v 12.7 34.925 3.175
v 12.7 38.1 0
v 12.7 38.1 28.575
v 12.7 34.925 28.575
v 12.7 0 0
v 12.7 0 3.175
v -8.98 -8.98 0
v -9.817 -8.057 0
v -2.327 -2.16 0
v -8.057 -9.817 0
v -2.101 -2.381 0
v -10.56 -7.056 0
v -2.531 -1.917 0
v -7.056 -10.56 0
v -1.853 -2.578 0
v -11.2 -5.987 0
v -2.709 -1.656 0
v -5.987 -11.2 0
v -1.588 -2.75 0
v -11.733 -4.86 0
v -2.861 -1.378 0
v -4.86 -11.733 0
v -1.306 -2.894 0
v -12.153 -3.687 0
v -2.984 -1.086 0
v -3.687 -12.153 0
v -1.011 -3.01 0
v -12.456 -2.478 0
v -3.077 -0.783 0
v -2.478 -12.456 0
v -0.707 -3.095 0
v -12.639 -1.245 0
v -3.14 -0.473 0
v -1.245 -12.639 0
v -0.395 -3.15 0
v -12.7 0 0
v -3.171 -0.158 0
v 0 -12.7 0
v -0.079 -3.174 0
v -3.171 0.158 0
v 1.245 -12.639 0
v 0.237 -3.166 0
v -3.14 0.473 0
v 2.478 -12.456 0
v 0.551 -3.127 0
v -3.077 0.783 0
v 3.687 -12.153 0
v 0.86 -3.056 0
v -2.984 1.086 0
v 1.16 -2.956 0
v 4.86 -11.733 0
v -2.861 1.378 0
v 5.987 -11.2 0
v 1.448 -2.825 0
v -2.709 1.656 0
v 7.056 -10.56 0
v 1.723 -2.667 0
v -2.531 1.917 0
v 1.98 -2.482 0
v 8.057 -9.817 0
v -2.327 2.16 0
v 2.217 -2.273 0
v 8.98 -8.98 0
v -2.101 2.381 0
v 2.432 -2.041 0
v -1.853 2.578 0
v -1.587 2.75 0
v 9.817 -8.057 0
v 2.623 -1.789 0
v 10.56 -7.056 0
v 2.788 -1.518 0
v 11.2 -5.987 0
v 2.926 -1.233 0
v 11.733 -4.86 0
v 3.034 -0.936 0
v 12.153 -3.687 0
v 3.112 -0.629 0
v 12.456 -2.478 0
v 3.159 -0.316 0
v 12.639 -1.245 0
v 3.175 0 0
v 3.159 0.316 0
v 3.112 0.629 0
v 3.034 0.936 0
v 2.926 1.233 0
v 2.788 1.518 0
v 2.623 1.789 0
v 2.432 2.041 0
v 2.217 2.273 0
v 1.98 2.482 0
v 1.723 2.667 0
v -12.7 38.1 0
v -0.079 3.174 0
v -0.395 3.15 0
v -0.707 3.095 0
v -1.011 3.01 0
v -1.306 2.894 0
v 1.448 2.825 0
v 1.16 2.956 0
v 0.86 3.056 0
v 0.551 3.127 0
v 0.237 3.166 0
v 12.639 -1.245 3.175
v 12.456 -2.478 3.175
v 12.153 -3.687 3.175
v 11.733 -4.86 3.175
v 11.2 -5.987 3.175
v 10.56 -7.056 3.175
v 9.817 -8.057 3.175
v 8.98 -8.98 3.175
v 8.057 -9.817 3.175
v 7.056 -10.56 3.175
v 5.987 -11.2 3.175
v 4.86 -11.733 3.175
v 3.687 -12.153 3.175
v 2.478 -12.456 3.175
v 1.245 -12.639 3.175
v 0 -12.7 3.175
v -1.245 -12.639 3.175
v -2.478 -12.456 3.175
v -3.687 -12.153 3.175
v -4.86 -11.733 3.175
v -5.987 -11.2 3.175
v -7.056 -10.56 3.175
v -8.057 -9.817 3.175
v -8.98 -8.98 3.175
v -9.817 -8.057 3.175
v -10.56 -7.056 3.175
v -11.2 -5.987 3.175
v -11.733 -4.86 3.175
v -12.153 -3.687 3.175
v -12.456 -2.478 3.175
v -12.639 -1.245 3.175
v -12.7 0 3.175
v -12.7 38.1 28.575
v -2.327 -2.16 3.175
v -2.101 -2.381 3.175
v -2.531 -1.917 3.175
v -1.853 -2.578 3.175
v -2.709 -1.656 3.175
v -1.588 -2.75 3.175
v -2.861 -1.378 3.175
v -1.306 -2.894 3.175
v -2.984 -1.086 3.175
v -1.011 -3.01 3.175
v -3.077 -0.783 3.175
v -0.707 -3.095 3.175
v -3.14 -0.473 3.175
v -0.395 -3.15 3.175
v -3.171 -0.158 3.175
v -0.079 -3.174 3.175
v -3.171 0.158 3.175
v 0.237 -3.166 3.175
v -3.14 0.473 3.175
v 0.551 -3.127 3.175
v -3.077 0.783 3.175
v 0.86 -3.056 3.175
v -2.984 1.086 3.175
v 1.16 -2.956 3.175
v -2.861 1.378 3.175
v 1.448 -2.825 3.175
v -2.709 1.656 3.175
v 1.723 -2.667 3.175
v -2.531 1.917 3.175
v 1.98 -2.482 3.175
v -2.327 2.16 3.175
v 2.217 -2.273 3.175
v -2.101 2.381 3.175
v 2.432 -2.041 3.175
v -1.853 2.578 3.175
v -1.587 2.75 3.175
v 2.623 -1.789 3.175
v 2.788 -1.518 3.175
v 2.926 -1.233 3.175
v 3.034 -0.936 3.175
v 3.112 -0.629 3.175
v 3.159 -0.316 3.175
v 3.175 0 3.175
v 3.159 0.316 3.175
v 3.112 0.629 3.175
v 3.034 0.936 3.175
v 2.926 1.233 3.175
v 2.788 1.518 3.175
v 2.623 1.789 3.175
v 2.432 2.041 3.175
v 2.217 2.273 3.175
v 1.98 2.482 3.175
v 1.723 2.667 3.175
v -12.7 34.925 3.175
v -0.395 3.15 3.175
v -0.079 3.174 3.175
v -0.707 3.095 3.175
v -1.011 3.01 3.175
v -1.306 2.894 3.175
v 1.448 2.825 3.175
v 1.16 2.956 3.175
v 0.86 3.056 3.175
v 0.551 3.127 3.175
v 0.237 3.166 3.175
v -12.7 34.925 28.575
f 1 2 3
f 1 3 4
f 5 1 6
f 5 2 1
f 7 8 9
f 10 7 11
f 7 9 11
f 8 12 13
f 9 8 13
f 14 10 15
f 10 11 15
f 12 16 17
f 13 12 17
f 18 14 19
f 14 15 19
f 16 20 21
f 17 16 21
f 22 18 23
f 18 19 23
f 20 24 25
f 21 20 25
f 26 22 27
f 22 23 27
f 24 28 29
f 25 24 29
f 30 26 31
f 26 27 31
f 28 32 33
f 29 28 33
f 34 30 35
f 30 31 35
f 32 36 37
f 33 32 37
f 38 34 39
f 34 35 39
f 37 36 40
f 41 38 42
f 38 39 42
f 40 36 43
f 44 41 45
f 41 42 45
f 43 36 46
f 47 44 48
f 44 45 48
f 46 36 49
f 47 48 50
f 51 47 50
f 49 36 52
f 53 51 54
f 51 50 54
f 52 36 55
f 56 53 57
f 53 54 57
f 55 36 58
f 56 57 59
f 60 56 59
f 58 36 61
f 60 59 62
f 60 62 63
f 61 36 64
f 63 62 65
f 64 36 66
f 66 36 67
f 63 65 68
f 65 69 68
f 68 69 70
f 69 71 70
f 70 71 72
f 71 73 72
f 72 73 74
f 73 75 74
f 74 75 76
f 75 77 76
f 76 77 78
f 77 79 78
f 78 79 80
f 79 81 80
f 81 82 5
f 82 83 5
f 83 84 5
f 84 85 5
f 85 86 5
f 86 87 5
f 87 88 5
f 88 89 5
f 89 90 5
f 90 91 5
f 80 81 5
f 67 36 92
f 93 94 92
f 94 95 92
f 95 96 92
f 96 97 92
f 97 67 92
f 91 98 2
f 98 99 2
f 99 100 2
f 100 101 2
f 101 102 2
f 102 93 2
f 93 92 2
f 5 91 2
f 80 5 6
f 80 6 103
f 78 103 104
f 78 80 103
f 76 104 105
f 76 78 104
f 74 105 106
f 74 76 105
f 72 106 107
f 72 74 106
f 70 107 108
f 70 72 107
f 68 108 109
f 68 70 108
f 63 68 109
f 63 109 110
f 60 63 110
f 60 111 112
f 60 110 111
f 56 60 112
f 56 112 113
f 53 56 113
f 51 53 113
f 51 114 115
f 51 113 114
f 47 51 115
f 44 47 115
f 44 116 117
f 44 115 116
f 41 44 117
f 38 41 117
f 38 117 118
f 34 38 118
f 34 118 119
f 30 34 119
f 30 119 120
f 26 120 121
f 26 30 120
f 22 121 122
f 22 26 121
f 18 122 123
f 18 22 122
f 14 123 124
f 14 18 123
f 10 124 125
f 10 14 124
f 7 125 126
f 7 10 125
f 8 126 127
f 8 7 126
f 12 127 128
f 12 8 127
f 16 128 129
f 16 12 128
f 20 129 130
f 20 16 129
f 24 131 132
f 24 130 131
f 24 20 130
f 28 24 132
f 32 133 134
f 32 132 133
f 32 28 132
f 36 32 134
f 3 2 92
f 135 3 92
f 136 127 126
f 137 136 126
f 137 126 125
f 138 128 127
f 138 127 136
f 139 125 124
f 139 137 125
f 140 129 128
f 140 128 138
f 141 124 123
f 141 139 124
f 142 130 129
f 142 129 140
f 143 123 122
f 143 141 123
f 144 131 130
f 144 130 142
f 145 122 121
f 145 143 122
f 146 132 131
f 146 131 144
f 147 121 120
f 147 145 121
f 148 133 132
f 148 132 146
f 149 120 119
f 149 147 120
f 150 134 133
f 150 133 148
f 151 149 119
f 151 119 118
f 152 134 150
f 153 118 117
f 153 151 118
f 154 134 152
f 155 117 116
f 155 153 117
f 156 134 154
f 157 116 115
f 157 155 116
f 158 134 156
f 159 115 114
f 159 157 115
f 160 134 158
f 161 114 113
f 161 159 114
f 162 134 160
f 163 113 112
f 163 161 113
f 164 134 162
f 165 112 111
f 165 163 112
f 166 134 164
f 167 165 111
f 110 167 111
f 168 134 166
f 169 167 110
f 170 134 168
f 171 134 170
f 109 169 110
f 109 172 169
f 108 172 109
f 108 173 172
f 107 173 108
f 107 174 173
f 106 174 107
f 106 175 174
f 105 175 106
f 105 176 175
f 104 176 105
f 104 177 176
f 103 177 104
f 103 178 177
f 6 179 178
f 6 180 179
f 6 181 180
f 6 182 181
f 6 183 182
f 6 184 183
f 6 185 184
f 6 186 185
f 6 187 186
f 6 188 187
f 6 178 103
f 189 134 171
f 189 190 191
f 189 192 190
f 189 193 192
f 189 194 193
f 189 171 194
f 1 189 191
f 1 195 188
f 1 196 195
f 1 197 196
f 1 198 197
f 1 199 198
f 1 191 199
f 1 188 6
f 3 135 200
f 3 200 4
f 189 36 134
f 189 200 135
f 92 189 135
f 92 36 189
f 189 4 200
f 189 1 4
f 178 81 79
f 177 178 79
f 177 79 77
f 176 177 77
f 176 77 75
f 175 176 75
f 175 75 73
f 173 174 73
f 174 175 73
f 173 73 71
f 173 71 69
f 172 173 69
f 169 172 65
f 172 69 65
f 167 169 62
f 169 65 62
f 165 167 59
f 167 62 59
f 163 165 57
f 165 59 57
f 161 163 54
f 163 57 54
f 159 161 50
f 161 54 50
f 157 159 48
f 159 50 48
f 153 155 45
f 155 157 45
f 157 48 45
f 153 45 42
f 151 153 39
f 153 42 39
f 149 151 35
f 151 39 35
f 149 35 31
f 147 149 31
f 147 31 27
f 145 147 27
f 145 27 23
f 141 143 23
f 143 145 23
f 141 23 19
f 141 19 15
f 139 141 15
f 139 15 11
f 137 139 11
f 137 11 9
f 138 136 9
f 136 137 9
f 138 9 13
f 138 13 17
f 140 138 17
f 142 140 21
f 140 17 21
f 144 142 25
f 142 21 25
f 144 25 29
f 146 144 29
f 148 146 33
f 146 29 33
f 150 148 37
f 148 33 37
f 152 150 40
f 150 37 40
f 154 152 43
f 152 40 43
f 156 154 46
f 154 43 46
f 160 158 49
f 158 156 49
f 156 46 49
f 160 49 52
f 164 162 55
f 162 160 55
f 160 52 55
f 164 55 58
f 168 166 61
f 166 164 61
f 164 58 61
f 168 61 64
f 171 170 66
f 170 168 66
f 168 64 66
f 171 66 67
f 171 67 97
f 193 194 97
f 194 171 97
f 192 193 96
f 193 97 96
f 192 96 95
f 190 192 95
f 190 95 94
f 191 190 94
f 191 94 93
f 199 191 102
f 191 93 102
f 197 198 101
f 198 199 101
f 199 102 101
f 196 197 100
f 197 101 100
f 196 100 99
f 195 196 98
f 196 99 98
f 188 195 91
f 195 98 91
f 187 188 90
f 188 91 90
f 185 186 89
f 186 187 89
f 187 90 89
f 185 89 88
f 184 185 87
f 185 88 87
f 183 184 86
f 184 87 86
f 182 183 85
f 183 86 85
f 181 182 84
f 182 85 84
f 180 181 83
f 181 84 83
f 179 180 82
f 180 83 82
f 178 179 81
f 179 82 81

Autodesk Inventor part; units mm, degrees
ref_plane "YZ Plane" through (0, 0, 0) normal (1, 0, 0) x (0, 1, 0)
ref_plane "XZ Plane" through (0, 0, 0) normal (0, 1, 0) x (-1, 0, 0)
ref_plane "XY Plane" through (0, 0, 0) normal (0, 0, 1) x (1, 0, 0)
sketch "Sketch1" plane through (0, 0, 0) normal (0, 0, 1) x (1, 0, 0)
  circle A0 centre (0, 0) radius 12.7
  line L0 (12.7, 0) -> (12.7, 38.1)
  line L1 (-12.7, 0) -> (-12.7, 38.1)
  line L2 (-12.7, 38.1) -> (12.7, 38.1)
  circle A1 centre (0, 0) radius 3.175
  dimension "d0" = 25.4
  dimension "d1" = 38.1
  dimension "d3" = 6.35
extrude "Extrusion1" add sketch "Sketch1" along normal blind 3.175
sketch "Sketch2" plane through (0, 0, 3.175) normal (0, 0, 1) x (1, 0, 0)
  line L0 (12.7, 38.1) -> (-12.7, 38.1) projected
  line L1 (-12.7, 38.1) -> (12.7, 38.1)
  line L2 (12.7, 38.1) -> (12.7, 34.925)
  line L3 (12.7, 34.925) -> (-12.7, 34.925)
  line L4 (-12.7, 34.925) -> (-12.7, 38.1)
  point P0 (0, 0)
  dimension "d6" = 25.4
  dimension "d7" = 3.175
extrude "Extrusion2" add sketch "Sketch2" along normal blind 25.4
properties part number "Roller holder"
